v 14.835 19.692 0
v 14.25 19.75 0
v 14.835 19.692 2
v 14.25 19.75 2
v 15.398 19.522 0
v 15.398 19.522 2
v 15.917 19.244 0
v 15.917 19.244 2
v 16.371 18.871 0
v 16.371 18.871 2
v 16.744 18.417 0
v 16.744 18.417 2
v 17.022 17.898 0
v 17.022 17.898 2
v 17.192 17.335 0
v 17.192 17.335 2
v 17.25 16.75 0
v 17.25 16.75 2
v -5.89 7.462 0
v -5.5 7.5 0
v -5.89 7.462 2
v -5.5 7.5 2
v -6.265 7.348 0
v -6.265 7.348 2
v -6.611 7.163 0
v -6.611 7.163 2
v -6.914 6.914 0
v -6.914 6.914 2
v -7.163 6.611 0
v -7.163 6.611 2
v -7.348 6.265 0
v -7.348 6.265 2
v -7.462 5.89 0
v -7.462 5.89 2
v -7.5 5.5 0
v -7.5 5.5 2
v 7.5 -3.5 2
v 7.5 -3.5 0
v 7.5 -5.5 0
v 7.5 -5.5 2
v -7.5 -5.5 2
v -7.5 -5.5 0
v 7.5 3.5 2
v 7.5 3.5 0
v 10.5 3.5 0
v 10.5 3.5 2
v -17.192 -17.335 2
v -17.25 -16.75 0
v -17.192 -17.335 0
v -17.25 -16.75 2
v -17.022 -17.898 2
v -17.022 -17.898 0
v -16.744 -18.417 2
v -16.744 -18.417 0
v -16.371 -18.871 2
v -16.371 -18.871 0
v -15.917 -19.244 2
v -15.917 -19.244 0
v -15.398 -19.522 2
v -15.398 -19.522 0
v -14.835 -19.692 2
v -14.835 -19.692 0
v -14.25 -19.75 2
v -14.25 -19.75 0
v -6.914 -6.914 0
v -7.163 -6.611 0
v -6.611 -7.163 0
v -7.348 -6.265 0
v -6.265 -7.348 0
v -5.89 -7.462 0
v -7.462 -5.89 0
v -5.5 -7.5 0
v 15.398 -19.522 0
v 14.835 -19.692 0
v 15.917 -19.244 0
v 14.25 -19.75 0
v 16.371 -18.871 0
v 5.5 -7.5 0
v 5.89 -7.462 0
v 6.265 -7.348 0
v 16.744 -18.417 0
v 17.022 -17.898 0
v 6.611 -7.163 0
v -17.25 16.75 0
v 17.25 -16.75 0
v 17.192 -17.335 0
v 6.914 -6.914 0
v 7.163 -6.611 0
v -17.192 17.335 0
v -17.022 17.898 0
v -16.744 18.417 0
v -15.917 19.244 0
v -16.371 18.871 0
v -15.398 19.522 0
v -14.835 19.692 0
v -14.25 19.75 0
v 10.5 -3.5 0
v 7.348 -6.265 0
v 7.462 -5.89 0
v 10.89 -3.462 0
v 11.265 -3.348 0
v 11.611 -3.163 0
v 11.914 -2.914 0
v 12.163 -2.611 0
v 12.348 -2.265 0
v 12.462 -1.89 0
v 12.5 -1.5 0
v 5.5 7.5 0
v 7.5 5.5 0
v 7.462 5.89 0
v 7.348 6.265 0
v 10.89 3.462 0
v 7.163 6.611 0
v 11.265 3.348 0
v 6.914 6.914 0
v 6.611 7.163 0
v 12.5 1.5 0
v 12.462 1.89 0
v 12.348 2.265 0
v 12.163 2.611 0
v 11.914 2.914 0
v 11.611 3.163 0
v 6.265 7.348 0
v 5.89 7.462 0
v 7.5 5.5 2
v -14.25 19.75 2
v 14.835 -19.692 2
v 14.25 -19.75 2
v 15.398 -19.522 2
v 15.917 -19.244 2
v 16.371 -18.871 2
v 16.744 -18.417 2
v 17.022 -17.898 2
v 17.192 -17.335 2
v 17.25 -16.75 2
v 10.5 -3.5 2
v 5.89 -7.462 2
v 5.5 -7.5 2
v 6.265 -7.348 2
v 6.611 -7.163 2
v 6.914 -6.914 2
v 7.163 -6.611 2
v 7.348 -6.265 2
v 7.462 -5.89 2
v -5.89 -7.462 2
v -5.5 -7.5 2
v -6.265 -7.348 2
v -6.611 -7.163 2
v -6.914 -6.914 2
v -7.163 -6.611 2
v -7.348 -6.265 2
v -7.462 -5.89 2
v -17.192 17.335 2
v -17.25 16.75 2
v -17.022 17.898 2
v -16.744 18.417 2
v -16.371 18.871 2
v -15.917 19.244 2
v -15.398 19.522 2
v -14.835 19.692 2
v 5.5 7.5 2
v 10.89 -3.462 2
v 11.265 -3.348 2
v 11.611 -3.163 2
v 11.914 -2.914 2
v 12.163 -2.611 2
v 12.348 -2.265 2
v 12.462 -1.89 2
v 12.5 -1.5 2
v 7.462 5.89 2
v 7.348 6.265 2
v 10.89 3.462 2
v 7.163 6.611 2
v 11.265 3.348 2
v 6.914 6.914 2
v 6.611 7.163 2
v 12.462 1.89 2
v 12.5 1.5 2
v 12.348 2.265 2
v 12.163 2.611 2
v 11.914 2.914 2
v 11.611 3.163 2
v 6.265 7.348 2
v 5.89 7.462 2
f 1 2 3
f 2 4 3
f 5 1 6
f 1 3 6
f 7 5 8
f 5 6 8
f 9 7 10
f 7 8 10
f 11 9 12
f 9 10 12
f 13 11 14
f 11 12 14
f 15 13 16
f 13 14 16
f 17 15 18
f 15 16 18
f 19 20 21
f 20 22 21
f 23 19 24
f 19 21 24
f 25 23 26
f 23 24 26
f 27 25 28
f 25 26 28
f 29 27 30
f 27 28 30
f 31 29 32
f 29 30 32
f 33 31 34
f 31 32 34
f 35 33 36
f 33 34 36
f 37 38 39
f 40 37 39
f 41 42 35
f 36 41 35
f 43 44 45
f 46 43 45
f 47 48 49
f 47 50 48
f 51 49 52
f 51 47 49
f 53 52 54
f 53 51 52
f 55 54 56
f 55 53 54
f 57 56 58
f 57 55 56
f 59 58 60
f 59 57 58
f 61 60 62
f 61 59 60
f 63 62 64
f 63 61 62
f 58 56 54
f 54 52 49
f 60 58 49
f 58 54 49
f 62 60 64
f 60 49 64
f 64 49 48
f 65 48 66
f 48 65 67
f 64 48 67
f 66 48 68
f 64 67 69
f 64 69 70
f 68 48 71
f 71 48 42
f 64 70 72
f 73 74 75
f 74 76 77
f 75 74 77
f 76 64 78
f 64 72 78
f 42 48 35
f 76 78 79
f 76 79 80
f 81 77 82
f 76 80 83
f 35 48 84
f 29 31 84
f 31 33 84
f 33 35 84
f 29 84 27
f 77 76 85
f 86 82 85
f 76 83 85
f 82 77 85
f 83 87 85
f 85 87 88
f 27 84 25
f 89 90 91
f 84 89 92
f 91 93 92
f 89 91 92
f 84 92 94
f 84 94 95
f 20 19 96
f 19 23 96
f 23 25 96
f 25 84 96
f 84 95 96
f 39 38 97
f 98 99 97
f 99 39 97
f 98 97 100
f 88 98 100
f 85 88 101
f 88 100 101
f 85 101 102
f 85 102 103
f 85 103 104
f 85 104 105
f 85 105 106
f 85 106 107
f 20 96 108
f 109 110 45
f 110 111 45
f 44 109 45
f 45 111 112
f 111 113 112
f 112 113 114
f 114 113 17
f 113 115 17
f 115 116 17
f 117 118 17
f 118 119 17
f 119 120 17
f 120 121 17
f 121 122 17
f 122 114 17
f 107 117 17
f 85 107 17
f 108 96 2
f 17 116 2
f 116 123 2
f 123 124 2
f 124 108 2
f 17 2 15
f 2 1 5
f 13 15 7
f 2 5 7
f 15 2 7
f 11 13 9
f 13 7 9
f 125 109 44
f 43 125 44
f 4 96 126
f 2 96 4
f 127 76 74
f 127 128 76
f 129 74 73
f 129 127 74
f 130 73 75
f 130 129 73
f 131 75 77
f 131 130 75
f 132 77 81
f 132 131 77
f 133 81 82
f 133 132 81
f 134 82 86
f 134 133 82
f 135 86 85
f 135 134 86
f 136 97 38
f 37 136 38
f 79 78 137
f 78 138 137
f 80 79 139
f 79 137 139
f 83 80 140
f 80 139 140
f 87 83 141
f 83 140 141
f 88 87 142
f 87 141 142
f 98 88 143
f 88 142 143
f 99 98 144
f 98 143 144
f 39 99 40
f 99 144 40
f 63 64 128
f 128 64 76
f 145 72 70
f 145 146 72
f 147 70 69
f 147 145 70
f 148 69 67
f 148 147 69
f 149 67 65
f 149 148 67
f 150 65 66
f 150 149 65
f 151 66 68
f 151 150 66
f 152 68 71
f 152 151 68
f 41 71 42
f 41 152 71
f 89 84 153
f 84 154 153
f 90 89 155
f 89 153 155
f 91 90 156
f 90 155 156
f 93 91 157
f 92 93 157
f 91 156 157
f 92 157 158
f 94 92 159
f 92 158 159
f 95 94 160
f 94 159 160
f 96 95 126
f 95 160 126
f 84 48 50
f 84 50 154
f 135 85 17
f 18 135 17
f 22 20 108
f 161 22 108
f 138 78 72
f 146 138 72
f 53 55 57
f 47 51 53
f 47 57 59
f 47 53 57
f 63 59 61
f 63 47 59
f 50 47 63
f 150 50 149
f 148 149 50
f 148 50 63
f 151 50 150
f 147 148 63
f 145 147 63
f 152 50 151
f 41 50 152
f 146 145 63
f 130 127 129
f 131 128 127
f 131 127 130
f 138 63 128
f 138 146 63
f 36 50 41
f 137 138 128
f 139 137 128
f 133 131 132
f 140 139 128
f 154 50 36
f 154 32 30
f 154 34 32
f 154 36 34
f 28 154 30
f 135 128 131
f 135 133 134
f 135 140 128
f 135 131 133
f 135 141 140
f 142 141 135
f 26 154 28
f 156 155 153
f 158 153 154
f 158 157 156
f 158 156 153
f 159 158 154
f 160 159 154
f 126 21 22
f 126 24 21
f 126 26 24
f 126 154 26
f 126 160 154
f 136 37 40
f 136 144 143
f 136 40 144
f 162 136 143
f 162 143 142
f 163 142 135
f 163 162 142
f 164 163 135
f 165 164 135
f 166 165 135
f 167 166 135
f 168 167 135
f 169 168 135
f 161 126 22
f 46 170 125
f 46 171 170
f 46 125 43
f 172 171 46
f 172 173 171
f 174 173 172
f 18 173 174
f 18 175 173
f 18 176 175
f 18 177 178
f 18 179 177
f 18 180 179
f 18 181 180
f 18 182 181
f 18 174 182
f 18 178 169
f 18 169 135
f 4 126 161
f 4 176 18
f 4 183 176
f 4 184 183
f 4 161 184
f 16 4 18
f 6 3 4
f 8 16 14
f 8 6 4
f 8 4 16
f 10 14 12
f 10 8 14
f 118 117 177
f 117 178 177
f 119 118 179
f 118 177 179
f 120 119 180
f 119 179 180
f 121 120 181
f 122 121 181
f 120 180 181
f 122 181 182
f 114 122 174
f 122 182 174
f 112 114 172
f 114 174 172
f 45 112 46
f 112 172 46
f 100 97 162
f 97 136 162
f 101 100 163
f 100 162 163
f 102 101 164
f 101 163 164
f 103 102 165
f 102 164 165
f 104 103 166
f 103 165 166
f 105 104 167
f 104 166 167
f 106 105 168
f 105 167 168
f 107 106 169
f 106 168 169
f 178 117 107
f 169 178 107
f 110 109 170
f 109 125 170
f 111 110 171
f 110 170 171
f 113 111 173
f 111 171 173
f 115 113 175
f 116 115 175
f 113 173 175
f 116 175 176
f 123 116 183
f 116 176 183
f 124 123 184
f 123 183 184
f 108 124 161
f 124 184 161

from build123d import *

# Parameters (mm, degrees)
SKETCH_W      = 34.5
SKETCH_H      = 39.5
EXTRUDE_DEPTH = 2
FILLET_R      = 3
FILLET001_R   = 2


with BuildPart() as part:
    # Sketch → Extrude (new body)
    with BuildSketch(Plane.XY):
        Rectangle(SKETCH_W, SKETCH_H)
        Polygon((-7.5, -7.5), (-7.5, 7.5), (7.5, 7.5), (7.5, 3.5), (12.5, 3.5), (12.5, -3.5), (7.5, -3.5), (7.5, -7.5), align=None, mode=Mode.SUBTRACT)
    extrude(amount=EXTRUDE_DEPTH)

    # Fillet
    fillet_edges = [part.edges().sort_by_distance(p)[0] for p in [
        (-17.25, -19.75, 1),
        (-17.25, 19.75, 1),
        (17.25, 19.75, 1),
        (17.25, -19.75, 1),
    ]]
    fillet(fillet_edges, radius=FILLET_R)

    # Fillet001
    fillet001_edges = [part.edges().sort_by_distance(p)[0] for p in [
        (-7.5, -7.5, 1),
        (-7.5, 7.5, 1),
        (7.5, 7.5, 1),
        (12.5, 3.5, 1),
        (12.5, -3.5, 1),
        (7.5, -7.5, 1),
    ]]
    fillet(fillet001_edges, radius=FILLET001_R)


solid = part.part
